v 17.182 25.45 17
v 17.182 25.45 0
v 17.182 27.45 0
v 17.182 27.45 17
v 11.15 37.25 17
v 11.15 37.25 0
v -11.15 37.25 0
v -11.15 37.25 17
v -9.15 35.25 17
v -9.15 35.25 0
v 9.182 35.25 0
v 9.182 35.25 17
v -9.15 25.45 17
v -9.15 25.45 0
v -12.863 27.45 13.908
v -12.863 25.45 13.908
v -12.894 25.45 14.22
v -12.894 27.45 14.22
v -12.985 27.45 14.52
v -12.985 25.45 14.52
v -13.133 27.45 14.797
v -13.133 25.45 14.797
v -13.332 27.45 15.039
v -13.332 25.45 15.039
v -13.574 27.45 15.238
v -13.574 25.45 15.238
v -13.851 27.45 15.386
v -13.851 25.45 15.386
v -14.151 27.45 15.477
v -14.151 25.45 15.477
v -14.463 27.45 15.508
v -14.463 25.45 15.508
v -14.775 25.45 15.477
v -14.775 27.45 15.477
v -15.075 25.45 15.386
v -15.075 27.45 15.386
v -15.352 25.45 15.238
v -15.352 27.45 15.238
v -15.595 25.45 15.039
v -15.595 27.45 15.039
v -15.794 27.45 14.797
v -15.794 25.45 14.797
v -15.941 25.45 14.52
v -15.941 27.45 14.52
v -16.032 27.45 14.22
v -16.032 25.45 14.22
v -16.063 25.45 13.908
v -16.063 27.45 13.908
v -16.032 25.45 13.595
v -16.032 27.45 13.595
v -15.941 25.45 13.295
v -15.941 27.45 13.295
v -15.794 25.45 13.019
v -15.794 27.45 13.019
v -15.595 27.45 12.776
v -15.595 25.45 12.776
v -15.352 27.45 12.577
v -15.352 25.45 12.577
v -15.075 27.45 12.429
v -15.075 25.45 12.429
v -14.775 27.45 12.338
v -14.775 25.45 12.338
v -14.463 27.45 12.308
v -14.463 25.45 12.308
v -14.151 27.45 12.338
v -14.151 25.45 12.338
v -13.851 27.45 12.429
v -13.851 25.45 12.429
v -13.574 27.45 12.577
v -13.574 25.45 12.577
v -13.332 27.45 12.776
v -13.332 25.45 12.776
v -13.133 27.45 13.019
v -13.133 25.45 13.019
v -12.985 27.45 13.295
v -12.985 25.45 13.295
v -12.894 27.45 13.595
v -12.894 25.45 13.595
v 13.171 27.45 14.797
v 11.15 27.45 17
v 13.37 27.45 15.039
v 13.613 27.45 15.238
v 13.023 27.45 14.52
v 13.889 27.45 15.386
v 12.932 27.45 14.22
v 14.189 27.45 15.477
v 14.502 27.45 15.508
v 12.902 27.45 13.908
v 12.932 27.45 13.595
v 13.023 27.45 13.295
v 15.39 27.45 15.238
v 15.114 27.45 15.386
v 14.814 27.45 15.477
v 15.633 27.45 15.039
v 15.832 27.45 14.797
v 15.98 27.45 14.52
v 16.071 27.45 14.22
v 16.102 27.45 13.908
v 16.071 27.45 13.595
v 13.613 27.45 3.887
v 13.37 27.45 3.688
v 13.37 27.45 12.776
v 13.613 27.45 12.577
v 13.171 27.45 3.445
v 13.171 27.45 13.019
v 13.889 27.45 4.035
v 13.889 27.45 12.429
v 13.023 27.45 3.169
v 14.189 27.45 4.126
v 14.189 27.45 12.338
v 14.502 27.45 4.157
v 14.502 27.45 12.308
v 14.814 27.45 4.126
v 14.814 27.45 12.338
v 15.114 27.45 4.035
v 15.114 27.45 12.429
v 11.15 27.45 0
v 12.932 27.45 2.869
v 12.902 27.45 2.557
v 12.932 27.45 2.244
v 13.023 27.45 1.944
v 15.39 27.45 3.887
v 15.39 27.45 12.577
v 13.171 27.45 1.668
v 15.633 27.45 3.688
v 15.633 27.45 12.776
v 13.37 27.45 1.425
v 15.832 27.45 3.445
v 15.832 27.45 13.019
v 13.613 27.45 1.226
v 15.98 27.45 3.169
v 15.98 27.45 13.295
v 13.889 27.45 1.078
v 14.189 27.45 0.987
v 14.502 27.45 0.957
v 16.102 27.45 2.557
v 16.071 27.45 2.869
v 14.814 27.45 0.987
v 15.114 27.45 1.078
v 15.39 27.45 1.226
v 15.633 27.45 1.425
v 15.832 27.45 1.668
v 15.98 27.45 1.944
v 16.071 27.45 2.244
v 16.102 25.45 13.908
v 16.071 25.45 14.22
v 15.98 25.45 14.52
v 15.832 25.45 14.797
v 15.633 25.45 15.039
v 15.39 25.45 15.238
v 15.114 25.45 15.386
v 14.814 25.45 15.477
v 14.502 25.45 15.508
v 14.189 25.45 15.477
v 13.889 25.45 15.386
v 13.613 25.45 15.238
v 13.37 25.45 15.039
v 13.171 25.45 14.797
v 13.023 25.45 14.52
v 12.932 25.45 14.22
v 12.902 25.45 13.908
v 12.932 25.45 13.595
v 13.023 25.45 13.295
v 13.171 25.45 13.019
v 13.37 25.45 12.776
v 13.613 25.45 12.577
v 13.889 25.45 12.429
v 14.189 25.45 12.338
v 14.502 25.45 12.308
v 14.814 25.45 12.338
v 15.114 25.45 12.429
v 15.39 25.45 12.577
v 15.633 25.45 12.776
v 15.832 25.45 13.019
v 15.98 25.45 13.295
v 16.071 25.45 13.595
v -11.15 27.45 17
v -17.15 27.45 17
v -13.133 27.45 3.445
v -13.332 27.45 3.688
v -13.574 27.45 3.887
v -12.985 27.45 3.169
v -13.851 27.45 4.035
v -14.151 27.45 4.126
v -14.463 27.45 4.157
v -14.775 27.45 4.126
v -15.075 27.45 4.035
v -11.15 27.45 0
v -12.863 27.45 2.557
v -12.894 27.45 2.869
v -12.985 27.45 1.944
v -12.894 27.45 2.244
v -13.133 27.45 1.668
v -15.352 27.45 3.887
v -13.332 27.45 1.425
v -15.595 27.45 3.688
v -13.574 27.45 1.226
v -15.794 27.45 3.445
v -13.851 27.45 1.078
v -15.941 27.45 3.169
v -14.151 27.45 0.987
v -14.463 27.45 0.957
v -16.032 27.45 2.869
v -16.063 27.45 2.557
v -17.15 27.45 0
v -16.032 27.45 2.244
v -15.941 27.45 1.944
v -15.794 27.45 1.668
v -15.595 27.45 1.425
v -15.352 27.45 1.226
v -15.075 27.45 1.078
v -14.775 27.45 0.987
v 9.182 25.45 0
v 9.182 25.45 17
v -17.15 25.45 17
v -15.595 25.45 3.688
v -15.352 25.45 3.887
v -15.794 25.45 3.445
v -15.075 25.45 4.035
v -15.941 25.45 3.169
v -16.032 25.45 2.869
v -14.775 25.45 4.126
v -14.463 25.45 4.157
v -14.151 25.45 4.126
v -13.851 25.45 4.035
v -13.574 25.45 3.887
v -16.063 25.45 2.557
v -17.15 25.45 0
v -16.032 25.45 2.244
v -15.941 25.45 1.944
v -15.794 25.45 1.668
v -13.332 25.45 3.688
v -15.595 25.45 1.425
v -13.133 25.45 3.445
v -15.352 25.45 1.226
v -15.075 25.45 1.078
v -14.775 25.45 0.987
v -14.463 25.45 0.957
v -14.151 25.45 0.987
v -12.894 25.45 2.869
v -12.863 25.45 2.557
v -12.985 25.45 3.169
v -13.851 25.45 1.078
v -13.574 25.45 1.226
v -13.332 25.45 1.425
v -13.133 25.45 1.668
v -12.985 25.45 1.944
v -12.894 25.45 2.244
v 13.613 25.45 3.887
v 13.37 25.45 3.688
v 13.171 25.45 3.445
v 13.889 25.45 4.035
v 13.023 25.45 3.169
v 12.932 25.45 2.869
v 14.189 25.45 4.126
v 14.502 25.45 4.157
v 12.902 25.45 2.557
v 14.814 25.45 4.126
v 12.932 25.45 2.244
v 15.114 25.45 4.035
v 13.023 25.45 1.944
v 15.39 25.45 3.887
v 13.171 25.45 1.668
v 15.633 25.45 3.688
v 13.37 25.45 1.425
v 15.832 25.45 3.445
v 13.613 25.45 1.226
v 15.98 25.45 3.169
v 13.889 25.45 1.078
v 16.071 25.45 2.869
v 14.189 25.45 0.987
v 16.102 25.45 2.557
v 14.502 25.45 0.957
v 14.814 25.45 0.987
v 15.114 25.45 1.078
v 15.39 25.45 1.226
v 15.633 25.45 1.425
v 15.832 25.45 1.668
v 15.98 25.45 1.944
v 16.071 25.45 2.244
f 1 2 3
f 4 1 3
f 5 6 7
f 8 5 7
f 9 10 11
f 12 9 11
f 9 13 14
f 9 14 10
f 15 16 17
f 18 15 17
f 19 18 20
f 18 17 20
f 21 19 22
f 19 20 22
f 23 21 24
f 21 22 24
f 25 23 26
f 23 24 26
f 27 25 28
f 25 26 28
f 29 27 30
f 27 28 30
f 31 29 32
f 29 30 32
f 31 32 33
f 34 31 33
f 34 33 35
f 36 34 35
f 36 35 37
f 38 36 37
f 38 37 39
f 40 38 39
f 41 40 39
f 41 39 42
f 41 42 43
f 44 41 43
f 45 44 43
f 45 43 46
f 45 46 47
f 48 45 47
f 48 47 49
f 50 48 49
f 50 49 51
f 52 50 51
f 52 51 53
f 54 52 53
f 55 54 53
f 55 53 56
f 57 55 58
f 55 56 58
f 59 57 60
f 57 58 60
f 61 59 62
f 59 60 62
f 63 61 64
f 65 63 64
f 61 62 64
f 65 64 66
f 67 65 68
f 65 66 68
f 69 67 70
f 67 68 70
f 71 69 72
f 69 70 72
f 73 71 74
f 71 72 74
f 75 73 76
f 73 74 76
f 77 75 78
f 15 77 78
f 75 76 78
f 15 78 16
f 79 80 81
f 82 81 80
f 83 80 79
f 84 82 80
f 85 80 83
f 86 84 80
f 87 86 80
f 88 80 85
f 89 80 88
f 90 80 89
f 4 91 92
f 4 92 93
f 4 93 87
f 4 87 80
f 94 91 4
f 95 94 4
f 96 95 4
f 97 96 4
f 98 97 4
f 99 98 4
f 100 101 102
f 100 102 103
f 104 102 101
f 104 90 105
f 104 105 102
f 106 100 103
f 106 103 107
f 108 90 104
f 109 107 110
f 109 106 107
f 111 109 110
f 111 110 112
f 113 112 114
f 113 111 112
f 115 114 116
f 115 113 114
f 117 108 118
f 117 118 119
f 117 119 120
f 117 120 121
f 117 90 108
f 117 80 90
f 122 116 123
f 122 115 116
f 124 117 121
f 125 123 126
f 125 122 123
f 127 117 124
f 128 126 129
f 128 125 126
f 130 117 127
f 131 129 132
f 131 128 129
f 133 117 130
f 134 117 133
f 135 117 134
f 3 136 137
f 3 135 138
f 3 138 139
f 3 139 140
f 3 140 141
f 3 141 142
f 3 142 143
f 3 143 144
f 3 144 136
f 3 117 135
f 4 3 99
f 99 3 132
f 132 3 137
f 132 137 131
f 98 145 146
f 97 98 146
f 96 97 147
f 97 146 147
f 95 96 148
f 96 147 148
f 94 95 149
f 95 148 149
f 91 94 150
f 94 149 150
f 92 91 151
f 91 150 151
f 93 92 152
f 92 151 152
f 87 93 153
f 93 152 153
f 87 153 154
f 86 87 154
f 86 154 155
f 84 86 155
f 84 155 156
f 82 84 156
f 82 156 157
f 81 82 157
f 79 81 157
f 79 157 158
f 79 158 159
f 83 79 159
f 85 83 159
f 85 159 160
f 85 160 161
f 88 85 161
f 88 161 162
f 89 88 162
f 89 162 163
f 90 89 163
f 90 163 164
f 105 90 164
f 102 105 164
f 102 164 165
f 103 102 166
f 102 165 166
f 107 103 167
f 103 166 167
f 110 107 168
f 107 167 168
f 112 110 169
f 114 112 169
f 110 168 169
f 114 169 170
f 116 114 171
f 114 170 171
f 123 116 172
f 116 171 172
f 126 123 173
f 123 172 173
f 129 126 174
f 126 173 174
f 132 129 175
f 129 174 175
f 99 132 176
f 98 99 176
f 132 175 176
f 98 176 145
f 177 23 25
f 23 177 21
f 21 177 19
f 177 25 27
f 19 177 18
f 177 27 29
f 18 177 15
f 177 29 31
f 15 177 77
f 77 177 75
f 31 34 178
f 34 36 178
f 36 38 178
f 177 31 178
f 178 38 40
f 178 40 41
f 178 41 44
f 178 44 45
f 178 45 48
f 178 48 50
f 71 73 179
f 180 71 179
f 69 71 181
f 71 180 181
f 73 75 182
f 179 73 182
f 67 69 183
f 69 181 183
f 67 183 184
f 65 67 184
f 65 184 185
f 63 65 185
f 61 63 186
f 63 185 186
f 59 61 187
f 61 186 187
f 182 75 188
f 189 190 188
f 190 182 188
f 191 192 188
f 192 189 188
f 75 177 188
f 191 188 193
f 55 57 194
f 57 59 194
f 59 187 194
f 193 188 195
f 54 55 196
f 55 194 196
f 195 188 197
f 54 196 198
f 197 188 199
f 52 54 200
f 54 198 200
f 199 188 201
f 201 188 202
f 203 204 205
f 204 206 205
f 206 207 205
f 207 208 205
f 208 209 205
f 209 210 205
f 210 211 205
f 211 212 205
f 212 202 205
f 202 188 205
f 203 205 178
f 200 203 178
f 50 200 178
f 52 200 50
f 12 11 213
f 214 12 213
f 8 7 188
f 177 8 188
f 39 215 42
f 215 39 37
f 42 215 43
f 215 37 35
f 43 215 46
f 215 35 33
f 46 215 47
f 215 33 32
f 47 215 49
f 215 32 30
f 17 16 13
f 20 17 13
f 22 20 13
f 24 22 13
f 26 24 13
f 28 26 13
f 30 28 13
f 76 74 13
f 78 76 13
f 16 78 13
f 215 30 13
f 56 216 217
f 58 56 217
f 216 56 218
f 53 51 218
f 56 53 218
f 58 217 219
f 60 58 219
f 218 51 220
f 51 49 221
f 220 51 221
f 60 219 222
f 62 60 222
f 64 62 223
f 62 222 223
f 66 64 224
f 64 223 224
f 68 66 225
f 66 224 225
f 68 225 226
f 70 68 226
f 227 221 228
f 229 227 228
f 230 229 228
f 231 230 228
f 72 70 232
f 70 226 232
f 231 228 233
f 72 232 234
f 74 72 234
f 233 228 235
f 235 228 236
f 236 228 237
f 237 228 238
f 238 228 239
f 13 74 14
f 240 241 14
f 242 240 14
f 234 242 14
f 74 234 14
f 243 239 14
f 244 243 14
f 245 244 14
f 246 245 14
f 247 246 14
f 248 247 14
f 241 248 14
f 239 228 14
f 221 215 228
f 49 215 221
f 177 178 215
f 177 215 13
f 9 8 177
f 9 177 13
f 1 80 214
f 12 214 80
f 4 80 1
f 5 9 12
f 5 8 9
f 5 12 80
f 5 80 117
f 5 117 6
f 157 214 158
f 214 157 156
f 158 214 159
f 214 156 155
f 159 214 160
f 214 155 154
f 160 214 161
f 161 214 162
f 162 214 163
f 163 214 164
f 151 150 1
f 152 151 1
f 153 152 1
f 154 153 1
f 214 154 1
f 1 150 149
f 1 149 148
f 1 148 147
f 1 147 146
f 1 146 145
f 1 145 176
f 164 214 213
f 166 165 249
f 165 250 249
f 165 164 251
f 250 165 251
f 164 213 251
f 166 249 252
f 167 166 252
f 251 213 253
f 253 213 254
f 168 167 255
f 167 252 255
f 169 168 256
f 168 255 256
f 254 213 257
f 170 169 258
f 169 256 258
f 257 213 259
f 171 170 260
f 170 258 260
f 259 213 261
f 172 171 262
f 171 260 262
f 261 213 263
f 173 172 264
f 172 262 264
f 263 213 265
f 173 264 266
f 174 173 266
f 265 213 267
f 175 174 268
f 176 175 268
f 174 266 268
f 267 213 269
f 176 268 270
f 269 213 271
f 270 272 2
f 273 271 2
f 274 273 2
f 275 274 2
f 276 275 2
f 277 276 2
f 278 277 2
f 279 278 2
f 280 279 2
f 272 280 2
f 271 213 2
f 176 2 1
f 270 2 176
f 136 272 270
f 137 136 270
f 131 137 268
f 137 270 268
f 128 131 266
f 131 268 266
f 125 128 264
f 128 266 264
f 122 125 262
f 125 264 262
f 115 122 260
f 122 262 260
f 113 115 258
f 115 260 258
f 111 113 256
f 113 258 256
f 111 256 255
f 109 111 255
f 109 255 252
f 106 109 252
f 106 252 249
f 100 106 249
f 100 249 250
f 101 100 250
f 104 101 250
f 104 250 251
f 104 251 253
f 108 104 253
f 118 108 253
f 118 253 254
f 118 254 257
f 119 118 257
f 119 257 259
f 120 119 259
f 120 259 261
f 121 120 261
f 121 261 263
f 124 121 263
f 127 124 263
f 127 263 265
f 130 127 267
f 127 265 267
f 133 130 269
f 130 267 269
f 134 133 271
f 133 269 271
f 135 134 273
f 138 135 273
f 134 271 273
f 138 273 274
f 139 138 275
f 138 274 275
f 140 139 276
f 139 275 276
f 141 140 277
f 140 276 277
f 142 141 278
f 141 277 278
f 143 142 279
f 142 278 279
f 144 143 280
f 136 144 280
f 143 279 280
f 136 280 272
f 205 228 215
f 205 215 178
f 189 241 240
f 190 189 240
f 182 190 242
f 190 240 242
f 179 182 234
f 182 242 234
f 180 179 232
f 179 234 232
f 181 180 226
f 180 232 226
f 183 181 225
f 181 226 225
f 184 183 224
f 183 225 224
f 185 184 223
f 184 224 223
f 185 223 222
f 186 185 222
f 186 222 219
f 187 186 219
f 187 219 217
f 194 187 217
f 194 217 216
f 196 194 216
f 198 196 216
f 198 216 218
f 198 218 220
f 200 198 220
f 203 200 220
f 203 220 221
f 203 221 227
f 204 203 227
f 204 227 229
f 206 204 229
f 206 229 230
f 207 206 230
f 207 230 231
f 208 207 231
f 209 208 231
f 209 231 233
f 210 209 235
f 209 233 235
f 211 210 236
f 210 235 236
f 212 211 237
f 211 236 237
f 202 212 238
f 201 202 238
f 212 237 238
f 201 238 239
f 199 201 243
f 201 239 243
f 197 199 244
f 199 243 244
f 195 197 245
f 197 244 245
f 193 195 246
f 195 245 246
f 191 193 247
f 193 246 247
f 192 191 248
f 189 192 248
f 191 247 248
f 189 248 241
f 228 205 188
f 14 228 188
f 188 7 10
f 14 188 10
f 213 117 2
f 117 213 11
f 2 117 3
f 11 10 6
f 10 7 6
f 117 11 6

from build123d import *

# Parameters (mm, degrees)
F0_W     = 6
F0_H     = 2
F0_W_2   = 2
F0_H_2   = 7.8
F0_W_3   = 18.3319213703
F0_W_4   = 1.9680786297
F0_W_5   = 6.0319213703
F1_DEPTH = 17
F3_D     = 3.2


with BuildPart() as f1:
    # F0 (on Top) → F1 (new body)
    with BuildSketch(Plane.XY):
        with Locations((-14.15, 26.4499383554)):
            Rectangle(F0_W, F0_H)
        with Locations((-10.15, 26.4499383554)):
            Rectangle(F0_W_2, F0_H)
        with Locations((-10.15, 31.3499383554)):
            Rectangle(F0_W_2, F0_H_2)
        with Locations((-10.15, 36.2499383554)):
            Rectangle(F0_W_2, F0_H)
        with Locations((0.0159606852, 36.2499383554)):
            Rectangle(F0_W_3, F0_H)
        with Locations((10.1659606852, 36.2499383554)):
            Rectangle(F0_W_4, F0_H)
        with Locations((10.1659606852, 31.3499383554)):
            Rectangle(F0_W_4, F0_H_2)
        with Locations((10.1659606852, 26.4499383554)):
            Rectangle(F0_W_4, F0_H)
        with Locations((14.1659606852, 26.4499383554)):
            Rectangle(F0_W_5, F0_H)
    extrude(amount=F1_DEPTH)

    # F3 (through all)
    with Locations(Plane(origin=(0, 27.4499383554, 0), x_dir=(-1, 0, 0), z_dir=(0, 1, 0))):
        with Locations((-14.5015409216, 13.9076234773), (-14.5015409216, 2.556569226), (14.4631639123, 2.556569226), (14.4631639123, 13.9076234773)):
            Hole(F3_D / 2)


solid = f1.part
